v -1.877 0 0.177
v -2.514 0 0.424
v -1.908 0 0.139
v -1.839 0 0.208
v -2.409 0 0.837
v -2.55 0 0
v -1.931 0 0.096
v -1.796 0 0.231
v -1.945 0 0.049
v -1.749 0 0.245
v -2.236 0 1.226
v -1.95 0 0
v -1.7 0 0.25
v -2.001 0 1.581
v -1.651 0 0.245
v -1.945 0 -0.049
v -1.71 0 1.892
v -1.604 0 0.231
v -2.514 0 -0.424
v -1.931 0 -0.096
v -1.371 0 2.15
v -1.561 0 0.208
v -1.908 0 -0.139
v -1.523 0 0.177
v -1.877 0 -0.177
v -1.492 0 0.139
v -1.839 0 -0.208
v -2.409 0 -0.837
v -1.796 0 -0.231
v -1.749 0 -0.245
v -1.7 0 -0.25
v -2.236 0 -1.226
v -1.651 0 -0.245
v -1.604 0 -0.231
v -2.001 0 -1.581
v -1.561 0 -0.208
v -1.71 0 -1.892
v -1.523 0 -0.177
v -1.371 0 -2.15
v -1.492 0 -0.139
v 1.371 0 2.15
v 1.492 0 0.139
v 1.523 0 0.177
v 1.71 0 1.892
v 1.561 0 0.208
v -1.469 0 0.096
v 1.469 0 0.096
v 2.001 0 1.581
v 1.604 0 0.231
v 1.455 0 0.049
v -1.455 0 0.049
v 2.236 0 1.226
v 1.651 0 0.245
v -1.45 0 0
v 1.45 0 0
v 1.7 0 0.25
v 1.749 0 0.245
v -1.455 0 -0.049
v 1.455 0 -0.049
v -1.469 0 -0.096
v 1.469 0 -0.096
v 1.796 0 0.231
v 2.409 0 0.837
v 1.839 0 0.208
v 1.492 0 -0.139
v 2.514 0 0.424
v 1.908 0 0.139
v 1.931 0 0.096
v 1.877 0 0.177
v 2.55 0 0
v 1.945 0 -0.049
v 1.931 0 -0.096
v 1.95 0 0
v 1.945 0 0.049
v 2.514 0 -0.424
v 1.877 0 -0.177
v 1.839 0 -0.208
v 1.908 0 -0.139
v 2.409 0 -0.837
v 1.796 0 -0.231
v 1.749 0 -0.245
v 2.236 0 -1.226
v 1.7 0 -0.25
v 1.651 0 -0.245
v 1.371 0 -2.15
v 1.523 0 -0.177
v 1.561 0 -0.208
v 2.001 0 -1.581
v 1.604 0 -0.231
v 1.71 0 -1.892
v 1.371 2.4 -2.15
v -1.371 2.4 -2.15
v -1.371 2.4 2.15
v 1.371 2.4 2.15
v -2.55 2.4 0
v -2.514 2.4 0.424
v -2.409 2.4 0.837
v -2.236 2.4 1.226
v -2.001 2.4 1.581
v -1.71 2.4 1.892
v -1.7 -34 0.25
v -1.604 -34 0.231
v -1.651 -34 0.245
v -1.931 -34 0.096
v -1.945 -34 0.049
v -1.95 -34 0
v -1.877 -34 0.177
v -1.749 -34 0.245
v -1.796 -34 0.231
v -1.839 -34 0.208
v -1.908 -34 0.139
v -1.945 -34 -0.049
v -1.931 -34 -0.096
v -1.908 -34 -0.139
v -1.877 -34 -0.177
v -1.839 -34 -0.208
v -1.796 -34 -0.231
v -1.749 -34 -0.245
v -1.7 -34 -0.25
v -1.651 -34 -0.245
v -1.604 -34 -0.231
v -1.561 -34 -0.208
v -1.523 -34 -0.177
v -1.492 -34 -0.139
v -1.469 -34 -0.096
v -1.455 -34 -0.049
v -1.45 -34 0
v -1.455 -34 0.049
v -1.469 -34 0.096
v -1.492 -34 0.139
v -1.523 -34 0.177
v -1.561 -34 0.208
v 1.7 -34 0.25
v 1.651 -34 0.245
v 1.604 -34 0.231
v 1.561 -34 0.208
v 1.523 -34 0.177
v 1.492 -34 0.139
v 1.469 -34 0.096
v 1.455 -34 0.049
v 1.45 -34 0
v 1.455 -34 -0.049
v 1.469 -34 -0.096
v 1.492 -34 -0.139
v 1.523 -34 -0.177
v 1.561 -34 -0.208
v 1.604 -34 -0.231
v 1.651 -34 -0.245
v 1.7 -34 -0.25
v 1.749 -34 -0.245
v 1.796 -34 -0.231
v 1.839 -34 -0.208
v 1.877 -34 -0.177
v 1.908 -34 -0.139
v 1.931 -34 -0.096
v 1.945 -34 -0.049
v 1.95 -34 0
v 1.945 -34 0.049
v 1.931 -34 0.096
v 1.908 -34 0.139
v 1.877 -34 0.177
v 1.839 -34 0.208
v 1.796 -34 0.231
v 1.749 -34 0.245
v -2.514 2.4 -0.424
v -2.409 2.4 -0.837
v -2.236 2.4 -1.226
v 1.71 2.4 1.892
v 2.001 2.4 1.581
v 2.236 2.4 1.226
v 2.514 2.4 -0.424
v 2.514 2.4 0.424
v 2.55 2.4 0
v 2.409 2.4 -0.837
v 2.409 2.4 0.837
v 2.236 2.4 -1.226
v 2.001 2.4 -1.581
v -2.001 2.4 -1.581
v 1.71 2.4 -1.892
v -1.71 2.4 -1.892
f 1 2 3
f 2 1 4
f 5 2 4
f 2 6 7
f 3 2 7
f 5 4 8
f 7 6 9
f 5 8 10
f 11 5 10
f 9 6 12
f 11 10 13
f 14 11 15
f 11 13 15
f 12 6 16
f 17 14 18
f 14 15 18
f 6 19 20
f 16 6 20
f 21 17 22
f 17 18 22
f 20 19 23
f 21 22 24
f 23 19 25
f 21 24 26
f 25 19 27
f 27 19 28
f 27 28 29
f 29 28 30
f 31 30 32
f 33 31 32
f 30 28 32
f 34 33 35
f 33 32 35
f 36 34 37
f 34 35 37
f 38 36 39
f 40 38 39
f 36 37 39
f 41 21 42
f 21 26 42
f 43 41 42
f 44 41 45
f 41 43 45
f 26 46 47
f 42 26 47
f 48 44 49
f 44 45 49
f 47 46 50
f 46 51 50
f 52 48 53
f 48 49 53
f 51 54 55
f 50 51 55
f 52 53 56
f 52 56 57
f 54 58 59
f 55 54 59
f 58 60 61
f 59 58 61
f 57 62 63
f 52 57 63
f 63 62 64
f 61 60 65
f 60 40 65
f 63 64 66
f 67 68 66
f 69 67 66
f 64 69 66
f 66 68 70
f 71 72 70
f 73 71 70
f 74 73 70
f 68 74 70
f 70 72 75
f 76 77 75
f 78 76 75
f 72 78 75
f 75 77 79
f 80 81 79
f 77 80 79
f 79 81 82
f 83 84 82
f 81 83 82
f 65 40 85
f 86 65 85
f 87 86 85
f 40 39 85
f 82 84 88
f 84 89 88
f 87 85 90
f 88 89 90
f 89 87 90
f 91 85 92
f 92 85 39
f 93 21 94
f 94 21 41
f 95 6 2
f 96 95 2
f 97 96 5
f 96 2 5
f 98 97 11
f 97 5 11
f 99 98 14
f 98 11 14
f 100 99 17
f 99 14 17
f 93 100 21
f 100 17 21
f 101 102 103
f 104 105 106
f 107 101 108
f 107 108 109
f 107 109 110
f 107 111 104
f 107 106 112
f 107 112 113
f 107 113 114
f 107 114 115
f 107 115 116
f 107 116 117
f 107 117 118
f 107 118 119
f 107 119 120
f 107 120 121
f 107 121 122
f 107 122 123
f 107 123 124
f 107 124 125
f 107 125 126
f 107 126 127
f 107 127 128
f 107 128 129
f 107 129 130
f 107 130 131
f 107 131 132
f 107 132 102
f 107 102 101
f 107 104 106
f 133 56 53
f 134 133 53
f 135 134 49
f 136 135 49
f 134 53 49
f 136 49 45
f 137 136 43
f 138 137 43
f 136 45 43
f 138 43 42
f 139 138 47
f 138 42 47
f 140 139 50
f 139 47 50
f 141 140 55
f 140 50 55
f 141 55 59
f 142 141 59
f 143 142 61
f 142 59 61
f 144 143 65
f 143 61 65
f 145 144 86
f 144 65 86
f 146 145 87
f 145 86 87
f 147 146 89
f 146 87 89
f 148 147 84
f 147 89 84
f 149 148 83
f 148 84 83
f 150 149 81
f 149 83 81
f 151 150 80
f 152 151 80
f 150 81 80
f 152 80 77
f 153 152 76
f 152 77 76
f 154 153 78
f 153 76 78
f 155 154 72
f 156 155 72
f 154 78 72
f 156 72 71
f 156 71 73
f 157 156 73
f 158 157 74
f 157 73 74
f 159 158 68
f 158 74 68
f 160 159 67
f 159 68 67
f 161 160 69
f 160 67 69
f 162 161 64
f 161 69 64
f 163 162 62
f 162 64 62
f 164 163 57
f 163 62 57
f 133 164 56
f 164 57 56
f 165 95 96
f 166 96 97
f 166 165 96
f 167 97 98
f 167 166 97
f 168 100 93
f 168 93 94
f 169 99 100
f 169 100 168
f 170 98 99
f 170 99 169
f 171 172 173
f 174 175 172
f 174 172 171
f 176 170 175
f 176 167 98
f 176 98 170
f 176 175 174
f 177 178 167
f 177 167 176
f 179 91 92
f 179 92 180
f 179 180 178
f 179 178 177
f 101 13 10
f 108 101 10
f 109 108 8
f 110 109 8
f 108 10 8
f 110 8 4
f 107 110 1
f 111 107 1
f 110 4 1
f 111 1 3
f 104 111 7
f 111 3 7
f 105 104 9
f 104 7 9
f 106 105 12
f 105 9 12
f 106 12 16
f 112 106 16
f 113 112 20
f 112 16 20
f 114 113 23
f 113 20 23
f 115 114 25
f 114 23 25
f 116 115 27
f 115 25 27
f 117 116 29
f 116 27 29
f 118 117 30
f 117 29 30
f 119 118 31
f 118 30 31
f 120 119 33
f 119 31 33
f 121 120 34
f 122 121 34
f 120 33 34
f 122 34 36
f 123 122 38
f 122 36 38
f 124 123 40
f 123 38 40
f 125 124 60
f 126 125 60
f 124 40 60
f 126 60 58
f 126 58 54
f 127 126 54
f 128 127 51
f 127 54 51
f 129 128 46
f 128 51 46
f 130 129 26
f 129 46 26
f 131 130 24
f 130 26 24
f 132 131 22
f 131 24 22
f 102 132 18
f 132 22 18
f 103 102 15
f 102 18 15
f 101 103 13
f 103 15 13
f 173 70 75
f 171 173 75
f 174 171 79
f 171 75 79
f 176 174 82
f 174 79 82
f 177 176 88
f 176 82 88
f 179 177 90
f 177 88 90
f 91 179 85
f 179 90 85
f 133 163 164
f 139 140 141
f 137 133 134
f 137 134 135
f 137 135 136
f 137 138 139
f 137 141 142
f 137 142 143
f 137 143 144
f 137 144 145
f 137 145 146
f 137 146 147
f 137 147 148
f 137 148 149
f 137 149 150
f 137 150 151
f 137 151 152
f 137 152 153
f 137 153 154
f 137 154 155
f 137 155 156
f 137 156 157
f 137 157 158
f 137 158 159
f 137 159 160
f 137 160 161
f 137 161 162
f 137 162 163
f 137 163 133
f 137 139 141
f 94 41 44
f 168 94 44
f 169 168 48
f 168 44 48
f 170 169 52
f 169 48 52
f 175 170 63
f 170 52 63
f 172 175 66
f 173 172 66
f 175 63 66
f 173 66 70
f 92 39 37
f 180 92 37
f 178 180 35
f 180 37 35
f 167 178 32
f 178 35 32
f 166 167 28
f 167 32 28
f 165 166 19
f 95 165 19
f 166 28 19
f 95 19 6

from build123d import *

# Parameters (mm, degrees)
BOSS_EXTRUDE1_DEPTH = 2.4
SKETCH2_R           = 0.25
BOSS_EXTRUDE2_DEPTH = 34


with BuildPart() as part:
    # Sketch1 → Boss-Extrude1 (new body)
    with BuildSketch(Plane(origin=(0, 0, 0), x_dir=(1, 0, 0), z_dir=(0, 1, 0))):
        with BuildLine():
            ThreePointArc((2.55, 0), (2.235943184, 1.22599269), (1.37113092, 2.15))
            Line((1.37113092, 2.15), (-1.37113092, 2.15))
            ThreePointArc((-1.37113092, 2.15), (-2.235943184, 1.22599269), (-2.55, 0))
            ThreePointArc((-2.55, 0), (-2.235943184, -1.22599269), (-1.37113092, -2.15))
            Line((-1.37113092, -2.15), (1.37113092, -2.15))
            ThreePointArc((1.37113092, -2.15), (2.235943184, -1.22599269), (2.55, 0))
        make_face()
    extrude(amount=BOSS_EXTRUDE1_DEPTH)

    # Sketch2 → Boss-Extrude2 (add)
    with BuildSketch(Plane.XZ):
        with Locations(Location((-1.7, 0, 0), (0, 0, 90))):
            Circle(SKETCH2_R)
        with Locations(Location((1.7, 0, 0), (0, 0, 90))):
            Circle(SKETCH2_R)
    extrude(amount=BOSS_EXTRUDE2_DEPTH)


solid = part.part
